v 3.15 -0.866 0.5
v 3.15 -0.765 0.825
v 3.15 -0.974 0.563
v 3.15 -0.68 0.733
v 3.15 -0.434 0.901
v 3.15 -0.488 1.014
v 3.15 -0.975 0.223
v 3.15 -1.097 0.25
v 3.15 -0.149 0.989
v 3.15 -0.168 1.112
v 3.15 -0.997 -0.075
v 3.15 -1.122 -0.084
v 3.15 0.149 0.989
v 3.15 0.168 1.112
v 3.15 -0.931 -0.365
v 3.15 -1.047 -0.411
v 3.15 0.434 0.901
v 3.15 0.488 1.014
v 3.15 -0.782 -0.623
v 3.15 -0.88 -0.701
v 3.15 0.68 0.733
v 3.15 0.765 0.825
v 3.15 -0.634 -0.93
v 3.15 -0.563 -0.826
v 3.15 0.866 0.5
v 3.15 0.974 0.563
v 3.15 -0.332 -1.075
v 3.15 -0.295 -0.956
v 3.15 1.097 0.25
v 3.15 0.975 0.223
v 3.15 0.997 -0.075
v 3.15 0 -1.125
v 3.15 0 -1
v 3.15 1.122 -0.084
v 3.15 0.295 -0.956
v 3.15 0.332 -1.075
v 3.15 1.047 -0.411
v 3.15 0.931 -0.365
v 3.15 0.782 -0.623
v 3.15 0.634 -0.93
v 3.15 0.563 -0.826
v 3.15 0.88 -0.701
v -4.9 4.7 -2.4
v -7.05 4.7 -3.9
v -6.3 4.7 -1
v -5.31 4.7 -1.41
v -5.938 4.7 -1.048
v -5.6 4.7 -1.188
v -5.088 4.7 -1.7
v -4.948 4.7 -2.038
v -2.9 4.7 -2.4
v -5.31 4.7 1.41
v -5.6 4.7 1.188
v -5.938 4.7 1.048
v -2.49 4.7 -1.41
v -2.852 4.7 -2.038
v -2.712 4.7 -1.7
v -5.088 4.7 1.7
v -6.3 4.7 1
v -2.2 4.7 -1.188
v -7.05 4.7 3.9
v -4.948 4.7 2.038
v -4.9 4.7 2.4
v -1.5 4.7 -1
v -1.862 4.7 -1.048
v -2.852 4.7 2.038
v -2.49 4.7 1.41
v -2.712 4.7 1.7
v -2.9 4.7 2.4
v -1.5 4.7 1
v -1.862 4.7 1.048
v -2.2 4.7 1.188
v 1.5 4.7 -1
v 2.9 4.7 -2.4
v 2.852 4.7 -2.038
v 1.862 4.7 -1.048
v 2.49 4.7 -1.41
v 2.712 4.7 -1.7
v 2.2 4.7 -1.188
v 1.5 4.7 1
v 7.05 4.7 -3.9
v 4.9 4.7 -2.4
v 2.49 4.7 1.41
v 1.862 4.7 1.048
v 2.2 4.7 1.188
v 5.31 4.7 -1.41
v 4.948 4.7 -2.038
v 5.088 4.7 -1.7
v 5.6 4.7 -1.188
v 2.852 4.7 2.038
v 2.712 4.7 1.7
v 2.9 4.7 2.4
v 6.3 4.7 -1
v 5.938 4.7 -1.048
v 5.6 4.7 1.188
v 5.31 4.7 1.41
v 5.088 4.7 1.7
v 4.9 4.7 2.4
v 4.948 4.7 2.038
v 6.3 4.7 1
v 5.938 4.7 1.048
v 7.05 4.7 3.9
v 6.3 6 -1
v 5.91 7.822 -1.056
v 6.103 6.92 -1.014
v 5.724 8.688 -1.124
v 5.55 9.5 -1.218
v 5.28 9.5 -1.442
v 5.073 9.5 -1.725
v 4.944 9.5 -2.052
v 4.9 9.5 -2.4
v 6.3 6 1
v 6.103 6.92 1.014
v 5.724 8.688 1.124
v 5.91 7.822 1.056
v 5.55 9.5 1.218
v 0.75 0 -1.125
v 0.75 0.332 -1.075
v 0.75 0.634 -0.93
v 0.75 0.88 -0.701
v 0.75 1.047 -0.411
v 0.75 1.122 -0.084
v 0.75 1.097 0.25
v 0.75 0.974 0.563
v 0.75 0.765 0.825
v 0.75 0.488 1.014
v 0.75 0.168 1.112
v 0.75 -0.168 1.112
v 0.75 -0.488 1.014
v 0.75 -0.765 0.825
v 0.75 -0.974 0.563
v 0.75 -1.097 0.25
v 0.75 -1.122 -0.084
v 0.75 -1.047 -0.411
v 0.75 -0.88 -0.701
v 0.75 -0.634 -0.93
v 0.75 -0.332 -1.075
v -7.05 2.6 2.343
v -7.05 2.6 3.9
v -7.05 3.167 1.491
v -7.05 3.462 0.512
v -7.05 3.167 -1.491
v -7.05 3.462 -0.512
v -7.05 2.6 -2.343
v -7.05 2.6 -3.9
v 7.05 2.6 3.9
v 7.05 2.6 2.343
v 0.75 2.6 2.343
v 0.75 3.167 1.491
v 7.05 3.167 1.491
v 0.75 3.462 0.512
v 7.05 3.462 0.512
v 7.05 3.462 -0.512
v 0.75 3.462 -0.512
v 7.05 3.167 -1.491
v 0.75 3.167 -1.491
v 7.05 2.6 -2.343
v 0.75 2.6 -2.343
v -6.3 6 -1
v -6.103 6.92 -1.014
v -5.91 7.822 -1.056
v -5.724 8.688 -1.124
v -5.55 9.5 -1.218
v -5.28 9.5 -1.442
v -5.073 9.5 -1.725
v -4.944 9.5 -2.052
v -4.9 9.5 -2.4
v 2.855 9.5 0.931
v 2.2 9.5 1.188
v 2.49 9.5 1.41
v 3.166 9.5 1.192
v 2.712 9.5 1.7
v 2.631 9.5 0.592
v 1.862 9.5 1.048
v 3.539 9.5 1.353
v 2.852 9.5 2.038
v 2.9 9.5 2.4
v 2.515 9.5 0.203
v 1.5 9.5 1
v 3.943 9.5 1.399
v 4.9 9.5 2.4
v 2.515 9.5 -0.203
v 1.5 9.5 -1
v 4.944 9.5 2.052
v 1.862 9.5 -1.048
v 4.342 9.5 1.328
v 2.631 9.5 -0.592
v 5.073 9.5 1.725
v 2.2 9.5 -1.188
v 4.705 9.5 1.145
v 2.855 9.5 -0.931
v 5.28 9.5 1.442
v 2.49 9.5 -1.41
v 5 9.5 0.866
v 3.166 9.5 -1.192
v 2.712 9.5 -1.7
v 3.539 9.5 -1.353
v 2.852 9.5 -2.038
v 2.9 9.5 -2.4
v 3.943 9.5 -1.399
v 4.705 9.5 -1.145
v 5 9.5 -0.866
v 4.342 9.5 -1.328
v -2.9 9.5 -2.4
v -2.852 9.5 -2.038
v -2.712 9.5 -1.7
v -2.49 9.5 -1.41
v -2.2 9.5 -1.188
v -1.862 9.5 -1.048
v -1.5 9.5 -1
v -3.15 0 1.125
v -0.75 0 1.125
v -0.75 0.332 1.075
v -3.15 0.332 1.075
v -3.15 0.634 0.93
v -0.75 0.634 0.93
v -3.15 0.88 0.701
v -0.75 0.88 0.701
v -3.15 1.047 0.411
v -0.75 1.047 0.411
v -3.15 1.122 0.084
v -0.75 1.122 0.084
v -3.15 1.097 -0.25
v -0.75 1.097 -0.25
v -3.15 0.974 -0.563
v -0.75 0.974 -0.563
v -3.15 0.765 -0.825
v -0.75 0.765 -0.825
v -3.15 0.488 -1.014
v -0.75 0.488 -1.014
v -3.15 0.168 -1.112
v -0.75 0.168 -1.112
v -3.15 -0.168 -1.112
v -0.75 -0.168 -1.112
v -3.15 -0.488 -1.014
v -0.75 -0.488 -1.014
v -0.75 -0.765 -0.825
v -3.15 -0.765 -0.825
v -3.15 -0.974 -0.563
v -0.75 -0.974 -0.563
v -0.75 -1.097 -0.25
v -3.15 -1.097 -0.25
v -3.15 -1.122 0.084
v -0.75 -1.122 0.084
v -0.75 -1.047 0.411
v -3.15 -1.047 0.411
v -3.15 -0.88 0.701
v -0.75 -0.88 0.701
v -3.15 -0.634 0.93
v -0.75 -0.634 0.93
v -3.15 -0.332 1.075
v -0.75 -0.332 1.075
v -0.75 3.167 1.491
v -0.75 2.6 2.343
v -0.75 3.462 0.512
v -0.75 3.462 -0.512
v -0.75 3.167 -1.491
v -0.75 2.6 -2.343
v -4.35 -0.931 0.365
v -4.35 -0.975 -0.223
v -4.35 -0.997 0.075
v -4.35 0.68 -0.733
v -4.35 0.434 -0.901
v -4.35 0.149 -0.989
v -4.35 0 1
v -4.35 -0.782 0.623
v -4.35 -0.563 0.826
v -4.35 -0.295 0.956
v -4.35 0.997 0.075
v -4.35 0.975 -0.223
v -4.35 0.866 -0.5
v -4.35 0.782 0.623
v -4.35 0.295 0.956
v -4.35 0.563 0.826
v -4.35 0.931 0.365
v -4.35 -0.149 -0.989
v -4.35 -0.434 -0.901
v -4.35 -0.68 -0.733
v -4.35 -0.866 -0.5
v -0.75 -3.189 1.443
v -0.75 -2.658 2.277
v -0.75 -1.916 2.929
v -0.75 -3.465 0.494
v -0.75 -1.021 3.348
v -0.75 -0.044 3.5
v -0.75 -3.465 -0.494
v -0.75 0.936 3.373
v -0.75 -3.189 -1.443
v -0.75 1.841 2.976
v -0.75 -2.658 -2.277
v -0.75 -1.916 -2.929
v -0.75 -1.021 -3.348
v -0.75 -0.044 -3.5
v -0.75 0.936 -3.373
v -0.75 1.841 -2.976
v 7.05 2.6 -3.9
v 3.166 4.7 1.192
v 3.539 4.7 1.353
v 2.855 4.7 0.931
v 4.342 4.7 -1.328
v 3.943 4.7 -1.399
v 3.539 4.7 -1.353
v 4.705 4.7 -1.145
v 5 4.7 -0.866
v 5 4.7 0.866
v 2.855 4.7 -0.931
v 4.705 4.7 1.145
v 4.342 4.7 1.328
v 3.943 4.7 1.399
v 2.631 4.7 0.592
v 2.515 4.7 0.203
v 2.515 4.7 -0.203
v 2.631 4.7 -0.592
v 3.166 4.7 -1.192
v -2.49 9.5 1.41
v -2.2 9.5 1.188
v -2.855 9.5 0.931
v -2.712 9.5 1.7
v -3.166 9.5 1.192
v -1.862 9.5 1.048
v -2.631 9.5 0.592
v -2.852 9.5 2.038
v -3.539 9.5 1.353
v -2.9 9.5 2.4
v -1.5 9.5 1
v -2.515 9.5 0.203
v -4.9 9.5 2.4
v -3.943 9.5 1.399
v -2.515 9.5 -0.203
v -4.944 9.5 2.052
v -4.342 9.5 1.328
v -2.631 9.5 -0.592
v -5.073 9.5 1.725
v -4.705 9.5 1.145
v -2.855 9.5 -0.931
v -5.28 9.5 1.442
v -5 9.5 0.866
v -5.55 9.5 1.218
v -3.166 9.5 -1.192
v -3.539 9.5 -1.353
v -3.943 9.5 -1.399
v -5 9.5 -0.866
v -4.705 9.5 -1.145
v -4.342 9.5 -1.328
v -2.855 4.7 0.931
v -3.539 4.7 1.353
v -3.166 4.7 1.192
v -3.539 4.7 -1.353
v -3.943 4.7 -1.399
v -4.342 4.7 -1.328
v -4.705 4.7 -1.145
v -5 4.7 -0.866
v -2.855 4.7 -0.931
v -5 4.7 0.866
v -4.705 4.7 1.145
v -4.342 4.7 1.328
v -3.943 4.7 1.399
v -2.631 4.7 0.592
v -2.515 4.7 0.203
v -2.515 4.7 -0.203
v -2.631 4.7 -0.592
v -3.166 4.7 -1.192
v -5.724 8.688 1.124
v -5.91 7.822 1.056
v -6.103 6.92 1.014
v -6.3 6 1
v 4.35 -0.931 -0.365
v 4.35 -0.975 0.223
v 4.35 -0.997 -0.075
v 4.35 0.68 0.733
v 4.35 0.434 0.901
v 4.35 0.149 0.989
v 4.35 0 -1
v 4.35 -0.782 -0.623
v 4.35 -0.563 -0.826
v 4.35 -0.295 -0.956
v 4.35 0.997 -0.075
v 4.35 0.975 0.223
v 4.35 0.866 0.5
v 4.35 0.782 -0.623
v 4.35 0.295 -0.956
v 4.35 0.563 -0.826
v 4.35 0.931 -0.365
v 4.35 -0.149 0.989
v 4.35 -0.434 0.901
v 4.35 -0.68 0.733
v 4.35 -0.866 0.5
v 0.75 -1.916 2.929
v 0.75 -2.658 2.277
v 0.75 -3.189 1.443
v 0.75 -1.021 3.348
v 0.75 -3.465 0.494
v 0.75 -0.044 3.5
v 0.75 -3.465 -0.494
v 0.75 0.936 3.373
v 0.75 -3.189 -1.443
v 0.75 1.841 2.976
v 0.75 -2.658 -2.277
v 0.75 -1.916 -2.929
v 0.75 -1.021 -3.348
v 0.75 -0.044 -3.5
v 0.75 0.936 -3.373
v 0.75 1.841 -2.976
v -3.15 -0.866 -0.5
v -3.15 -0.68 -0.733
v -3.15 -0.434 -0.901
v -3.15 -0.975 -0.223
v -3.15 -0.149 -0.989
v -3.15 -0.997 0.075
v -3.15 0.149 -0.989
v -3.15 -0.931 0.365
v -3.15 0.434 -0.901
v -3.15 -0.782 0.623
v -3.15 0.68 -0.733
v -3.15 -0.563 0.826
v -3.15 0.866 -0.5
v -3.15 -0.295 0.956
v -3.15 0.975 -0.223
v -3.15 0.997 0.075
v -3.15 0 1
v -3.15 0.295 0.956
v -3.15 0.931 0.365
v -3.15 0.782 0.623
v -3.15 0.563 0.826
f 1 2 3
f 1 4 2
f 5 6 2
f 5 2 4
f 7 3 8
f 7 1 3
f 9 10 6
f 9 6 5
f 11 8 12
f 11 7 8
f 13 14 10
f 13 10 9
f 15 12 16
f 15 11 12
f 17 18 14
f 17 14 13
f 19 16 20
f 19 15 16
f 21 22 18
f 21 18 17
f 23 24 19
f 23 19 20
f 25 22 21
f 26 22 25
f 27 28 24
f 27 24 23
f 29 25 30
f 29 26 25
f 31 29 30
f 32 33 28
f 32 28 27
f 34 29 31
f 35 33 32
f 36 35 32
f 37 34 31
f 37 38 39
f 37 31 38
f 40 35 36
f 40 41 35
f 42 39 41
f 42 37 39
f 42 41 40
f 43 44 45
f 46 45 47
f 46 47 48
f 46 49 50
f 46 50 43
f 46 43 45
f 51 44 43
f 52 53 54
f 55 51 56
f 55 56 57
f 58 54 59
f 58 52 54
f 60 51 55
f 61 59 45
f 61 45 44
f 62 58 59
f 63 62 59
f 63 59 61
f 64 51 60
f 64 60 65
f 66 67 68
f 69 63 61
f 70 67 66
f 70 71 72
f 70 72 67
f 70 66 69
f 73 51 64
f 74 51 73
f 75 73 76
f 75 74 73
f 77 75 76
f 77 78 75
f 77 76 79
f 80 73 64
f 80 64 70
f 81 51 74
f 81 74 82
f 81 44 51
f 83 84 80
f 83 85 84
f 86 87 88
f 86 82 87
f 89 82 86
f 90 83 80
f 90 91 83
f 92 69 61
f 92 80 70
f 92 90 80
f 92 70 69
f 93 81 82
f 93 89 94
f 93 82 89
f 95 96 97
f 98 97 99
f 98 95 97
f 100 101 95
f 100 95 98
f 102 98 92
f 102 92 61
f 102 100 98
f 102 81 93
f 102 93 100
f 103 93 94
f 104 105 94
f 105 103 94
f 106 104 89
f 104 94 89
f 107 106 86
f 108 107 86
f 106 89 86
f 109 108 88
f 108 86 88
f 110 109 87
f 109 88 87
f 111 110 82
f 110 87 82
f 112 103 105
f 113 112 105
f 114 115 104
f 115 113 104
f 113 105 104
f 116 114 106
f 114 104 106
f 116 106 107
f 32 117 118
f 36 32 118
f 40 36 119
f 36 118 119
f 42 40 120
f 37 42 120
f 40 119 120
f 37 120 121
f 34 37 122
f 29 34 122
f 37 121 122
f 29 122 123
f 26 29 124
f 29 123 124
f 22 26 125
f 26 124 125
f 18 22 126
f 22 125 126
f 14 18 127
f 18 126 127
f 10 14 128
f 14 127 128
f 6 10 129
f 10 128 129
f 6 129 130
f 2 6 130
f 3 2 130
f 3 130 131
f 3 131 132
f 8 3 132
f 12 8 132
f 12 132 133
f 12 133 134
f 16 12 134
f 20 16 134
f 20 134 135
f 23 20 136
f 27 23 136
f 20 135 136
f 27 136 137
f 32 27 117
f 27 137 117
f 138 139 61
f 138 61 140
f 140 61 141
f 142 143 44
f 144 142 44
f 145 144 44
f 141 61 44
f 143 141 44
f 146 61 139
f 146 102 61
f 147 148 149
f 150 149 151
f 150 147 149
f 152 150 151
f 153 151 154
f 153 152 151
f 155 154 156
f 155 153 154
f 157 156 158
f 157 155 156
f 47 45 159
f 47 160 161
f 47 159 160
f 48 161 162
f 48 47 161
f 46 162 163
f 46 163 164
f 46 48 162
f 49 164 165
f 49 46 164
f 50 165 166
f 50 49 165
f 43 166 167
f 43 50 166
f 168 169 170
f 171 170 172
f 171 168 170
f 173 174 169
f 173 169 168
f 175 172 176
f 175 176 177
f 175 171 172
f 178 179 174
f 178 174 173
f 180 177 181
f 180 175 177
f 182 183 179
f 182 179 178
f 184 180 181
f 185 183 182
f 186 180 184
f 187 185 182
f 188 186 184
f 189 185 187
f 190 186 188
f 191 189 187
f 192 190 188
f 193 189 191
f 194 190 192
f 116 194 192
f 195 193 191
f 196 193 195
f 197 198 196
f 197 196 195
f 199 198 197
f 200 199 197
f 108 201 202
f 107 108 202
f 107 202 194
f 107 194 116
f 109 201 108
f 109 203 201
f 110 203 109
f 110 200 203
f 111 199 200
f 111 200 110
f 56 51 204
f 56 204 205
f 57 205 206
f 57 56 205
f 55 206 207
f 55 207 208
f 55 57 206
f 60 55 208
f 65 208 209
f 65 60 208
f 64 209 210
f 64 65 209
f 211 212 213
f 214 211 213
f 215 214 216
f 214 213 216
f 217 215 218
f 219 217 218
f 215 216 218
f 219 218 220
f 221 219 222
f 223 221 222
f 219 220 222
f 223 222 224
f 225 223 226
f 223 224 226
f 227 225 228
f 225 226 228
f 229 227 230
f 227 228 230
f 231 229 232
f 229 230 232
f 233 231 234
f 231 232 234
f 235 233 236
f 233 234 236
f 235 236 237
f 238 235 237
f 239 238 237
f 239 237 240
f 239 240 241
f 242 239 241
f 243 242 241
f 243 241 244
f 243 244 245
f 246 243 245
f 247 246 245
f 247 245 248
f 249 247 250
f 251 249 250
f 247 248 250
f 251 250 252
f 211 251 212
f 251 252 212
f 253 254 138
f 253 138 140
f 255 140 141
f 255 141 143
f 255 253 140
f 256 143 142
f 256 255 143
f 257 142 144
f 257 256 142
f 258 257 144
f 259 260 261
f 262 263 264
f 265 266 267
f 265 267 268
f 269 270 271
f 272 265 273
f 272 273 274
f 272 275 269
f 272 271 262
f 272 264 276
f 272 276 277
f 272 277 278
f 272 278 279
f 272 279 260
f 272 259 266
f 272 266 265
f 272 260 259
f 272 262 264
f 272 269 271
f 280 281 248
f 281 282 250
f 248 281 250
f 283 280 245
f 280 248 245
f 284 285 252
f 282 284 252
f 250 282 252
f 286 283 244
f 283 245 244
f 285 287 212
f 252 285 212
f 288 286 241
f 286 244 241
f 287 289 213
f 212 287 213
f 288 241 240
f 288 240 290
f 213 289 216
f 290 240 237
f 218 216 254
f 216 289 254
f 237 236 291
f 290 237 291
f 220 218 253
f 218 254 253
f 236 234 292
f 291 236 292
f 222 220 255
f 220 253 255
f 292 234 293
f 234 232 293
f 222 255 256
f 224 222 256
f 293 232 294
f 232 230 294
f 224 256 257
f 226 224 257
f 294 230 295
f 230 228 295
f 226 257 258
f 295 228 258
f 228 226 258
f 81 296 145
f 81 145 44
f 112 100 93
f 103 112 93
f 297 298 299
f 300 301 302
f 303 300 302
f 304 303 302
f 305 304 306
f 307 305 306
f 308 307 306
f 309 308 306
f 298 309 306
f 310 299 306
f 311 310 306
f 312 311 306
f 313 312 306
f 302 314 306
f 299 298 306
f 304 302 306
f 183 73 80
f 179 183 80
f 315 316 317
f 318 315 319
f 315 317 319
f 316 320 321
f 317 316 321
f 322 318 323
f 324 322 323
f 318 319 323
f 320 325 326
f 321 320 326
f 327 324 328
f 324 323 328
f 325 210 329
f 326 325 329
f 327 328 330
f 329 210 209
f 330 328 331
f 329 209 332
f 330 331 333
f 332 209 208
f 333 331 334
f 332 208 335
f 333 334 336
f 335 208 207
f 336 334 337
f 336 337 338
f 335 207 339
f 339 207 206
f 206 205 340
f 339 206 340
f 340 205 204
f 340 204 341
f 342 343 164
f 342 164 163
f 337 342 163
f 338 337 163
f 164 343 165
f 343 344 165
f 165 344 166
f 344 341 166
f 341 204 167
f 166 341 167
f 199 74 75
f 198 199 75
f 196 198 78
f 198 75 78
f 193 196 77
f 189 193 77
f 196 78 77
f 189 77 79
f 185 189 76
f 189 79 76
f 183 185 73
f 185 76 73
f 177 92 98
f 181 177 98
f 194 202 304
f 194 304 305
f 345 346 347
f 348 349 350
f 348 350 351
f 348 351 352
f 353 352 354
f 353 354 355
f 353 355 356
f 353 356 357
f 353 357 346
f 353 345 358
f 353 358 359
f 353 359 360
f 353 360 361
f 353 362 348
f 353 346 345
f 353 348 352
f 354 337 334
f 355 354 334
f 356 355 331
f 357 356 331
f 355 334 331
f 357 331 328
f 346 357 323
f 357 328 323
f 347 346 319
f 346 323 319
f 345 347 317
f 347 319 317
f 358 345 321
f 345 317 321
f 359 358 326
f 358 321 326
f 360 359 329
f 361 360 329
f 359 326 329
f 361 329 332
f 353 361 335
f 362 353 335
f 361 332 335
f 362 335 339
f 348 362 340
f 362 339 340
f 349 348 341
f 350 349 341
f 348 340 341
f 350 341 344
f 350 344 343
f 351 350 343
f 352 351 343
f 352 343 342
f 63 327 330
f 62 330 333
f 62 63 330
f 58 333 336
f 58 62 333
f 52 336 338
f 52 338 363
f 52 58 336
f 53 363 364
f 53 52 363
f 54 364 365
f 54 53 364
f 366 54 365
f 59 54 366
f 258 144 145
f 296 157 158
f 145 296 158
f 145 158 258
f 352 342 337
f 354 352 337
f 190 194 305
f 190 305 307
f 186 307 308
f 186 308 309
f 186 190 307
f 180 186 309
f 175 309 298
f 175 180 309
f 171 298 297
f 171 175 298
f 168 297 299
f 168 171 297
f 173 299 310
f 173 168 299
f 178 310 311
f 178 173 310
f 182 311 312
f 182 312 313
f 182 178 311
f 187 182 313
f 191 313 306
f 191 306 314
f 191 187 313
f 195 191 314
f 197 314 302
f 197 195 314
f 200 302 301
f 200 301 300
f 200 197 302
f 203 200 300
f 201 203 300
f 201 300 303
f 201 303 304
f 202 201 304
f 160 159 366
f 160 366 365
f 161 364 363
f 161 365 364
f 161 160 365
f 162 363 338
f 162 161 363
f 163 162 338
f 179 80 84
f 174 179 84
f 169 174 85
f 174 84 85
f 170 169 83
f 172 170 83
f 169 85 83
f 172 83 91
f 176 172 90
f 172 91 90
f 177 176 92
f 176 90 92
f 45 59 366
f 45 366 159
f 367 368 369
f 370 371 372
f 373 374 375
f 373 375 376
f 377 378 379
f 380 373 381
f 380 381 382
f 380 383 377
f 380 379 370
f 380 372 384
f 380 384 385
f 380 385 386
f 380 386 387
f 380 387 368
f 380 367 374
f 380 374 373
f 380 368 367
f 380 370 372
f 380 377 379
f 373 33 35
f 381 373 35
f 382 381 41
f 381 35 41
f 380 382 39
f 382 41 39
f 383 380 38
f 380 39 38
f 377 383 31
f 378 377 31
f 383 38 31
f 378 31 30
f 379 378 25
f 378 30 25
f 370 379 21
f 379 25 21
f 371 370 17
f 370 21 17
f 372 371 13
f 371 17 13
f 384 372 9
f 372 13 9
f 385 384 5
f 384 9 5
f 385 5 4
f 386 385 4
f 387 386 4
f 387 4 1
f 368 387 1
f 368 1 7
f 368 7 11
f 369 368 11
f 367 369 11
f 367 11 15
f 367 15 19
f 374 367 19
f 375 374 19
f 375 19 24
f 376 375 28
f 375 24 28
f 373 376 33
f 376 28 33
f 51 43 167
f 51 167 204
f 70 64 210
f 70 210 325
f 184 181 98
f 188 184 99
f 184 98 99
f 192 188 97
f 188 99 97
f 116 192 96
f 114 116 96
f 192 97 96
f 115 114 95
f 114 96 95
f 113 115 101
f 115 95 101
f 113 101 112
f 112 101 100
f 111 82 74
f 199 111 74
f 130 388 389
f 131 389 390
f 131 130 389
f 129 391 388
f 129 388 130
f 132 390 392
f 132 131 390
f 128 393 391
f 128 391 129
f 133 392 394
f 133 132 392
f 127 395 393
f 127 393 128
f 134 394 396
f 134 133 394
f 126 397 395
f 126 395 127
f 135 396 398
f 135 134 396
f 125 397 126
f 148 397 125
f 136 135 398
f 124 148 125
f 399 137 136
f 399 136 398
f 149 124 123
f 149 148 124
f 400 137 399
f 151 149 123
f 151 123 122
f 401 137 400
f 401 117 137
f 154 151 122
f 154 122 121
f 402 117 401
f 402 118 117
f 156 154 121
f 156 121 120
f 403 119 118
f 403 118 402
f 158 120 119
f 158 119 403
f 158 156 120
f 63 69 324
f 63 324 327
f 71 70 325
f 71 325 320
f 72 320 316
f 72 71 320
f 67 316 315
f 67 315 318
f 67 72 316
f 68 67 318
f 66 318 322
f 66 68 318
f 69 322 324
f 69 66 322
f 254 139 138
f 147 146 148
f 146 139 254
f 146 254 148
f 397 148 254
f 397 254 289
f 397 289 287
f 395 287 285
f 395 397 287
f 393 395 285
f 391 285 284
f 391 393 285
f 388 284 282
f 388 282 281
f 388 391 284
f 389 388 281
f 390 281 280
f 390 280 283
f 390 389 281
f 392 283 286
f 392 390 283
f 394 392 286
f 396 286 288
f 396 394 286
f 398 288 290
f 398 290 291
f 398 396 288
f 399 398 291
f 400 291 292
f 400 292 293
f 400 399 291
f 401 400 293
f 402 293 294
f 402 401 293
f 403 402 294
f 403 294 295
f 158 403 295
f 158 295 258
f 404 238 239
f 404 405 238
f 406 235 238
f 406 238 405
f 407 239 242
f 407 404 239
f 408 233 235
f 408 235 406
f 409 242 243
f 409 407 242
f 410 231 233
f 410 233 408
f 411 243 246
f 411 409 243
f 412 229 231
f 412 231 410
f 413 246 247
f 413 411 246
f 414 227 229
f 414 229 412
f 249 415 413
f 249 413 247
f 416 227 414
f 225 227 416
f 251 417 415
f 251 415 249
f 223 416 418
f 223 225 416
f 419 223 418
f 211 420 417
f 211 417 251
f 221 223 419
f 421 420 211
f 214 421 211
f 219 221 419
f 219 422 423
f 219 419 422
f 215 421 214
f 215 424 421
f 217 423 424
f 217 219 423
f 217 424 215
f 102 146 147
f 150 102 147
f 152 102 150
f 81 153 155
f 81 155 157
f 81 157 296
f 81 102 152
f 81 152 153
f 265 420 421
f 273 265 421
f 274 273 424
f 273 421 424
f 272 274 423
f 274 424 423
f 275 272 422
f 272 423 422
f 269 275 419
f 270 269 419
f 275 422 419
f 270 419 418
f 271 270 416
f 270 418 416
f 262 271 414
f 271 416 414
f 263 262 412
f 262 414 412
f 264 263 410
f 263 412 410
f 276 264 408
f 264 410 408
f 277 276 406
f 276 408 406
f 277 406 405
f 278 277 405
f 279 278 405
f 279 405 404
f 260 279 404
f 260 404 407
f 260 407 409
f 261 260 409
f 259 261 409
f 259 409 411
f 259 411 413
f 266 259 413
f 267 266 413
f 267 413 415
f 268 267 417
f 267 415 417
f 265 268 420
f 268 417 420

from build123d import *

# Parameters (mm, degrees)
BOSS_EXTRUDE1_DEPTH     = 7.05
SKETCH4_R               = 3.5
BOSS_EXTRUDE2_DEPTH     = 0.75
SKETCH5_R               = 1.125
BOSS_EXTRUDE3_DEPTH     = 2.4
SKETCH6_R               = 1
BOSS_EXTRUDE4_DEPTH     = 1.2
SKETCH7_R               = 1.125
BOSS_EXTRUDE5_DEPTH     = 2.4
SKETCH8_R               = 1
BOSS_EXTRUDE6_DEPTH     = 1.2
BOSS_EXTRUDE8_DEPTH     = 4.8
CUT_EXTRUDE1_DEPTH      = 4.8
CUT_EXTRUDE2_DEPTH      = 4.9
CUT_EXTRUDE2_DEPTH_BACK = 4.9


with BuildPart() as part:
    # Sketch2 → Boss-Extrude1 (new body, symmetric)
    with BuildSketch(Plane(origin=(0, 0, 0), x_dir=(0, 0, -1), z_dir=(1, 0, 0))):
        with BuildLine():
            ThreePointArc((-2.343074903, 2.6), (0, 3.5), (2.343074903, 2.6))
            Line((2.343074903, 2.6), (3.9, 2.6))
            Line((3.9, 2.6), (3.9, 4.7))
            Line((3.9, 4.7), (-3.9, 4.7))
            Line((-3.9, 4.7), (-3.9, 2.6))
            Line((-3.9, 2.6), (-2.343074903, 2.6))
        make_face()
    extrude(amount=BOSS_EXTRUDE1_DEPTH, both=True)

    # Sketch4 → Boss-Extrude2 (add, symmetric)
    with BuildSketch(Plane(origin=(0, 0, 0), x_dir=(0, 0, -1), z_dir=(1, 0, 0))):
        Circle(SKETCH4_R)
    extrude(amount=BOSS_EXTRUDE2_DEPTH, both=True)

    # Sketch5 → Boss-Extrude3 (add)
    with BuildSketch(Plane(origin=(0.75, 0, 0), x_dir=(0, 0, -1), z_dir=(1, 0, 0))):
        Circle(SKETCH5_R)
    extrude(amount=BOSS_EXTRUDE3_DEPTH)

    # Sketch6 → Boss-Extrude4 (add)
    with BuildSketch(Plane(origin=(3.15, 0, 0), x_dir=(0, 0, -1), z_dir=(1, 0, 0))):
        Circle(SKETCH6_R)
    extrude(amount=BOSS_EXTRUDE4_DEPTH)

    # Sketch7 → Boss-Extrude5 (add)
    with BuildSketch(Plane.ZY.offset(0.75)):
        Circle(SKETCH7_R)
    extrude(amount=BOSS_EXTRUDE5_DEPTH)

    # Sketch8 → Boss-Extrude6 (add)
    with BuildSketch(Plane.ZY.offset(3.15)):
        Circle(SKETCH8_R)
    extrude(amount=BOSS_EXTRUDE6_DEPTH)

    # Sketch9 → Boss-Extrude8 (add)
    with BuildSketch(Plane(origin=(0, 4.7, 0), x_dir=(1, 0, 0), z_dir=(0, 1, 0))):
        with BuildLine():
            Line((2.9, -2.4), (4.9, -2.4))
            ThreePointArc((4.9, -2.4), (5.310050506, -1.410050506), (6.3, -1))
            Line((6.3, -1), (6.3, 1))
            ThreePointArc((6.3, 1), (5.310050506, 1.410050506), (4.9, 2.4))
            Line((4.9, 2.4), (2.9, 2.4))
            ThreePointArc((2.9, 2.4), (2.489949494, 1.410050506), (1.5, 1))
            Line((1.5, 1), (1.5, -1))
            ThreePointArc((1.5, -1), (2.489949494, -1.410050506), (2.9, -2.4))
        make_face()
        with BuildLine():
            Line((-6.3, -1), (-6.3, 1))
            ThreePointArc((-6.3, 1), (-5.310050506, 1.410050506), (-4.9, 2.4))
            Line((-4.9, 2.4), (-2.9, 2.4))
            ThreePointArc((-2.9, 2.4), (-2.489949494, 1.410050506), (-1.5, 1))
            Line((-1.5, 1), (-1.5, -1))
            ThreePointArc((-1.5, -1), (-2.489949494, -1.410050506), (-2.9, -2.4))
            Line((-2.9, -2.4), (-4.9, -2.4))
            ThreePointArc((-4.9, -2.4), (-5.310050506, -1.410050506), (-6.3, -1))
        make_face()
    extrude(amount=BOSS_EXTRUDE8_DEPTH)

    # Sketch10 → Cut-Extrude1 (cut)
    with BuildSketch(Plane(origin=(0, 9.5, 0), x_dir=(1, 0, 0), z_dir=(0, 1, 0))):
        with BuildLine():
            Line((5, 0.866025404), (5, -0.866025404))
            ThreePointArc((5, -0.866025404), (2.5, 0), (5, 0.866025404))
        make_face()
        with BuildLine():
            Line((-5, 0.866025404), (-5, -0.866025404))
            ThreePointArc((-5, -0.866025404), (-2.5, 0), (-5, 0.866025404))
        make_face()
    extrude(amount=-CUT_EXTRUDE1_DEPTH, mode=Mode.SUBTRACT)

    # Sketch12 → Cut-Extrude2 (cut, two sides)
    with BuildSketch(Plane.XY) as cut_extrude2_sk:
        Polygon((5.55, 9.5), (6.3, 9.5), (6.3, 6), align=None)
        Polygon((-6.3, 6), (-5.55, 9.5), (-6.3, 9.5), align=None)
    extrude(amount=CUT_EXTRUDE2_DEPTH, mode=Mode.SUBTRACT)
    extrude(cut_extrude2_sk.sketch, amount=-CUT_EXTRUDE2_DEPTH_BACK, mode=Mode.SUBTRACT)


solid = part.part
